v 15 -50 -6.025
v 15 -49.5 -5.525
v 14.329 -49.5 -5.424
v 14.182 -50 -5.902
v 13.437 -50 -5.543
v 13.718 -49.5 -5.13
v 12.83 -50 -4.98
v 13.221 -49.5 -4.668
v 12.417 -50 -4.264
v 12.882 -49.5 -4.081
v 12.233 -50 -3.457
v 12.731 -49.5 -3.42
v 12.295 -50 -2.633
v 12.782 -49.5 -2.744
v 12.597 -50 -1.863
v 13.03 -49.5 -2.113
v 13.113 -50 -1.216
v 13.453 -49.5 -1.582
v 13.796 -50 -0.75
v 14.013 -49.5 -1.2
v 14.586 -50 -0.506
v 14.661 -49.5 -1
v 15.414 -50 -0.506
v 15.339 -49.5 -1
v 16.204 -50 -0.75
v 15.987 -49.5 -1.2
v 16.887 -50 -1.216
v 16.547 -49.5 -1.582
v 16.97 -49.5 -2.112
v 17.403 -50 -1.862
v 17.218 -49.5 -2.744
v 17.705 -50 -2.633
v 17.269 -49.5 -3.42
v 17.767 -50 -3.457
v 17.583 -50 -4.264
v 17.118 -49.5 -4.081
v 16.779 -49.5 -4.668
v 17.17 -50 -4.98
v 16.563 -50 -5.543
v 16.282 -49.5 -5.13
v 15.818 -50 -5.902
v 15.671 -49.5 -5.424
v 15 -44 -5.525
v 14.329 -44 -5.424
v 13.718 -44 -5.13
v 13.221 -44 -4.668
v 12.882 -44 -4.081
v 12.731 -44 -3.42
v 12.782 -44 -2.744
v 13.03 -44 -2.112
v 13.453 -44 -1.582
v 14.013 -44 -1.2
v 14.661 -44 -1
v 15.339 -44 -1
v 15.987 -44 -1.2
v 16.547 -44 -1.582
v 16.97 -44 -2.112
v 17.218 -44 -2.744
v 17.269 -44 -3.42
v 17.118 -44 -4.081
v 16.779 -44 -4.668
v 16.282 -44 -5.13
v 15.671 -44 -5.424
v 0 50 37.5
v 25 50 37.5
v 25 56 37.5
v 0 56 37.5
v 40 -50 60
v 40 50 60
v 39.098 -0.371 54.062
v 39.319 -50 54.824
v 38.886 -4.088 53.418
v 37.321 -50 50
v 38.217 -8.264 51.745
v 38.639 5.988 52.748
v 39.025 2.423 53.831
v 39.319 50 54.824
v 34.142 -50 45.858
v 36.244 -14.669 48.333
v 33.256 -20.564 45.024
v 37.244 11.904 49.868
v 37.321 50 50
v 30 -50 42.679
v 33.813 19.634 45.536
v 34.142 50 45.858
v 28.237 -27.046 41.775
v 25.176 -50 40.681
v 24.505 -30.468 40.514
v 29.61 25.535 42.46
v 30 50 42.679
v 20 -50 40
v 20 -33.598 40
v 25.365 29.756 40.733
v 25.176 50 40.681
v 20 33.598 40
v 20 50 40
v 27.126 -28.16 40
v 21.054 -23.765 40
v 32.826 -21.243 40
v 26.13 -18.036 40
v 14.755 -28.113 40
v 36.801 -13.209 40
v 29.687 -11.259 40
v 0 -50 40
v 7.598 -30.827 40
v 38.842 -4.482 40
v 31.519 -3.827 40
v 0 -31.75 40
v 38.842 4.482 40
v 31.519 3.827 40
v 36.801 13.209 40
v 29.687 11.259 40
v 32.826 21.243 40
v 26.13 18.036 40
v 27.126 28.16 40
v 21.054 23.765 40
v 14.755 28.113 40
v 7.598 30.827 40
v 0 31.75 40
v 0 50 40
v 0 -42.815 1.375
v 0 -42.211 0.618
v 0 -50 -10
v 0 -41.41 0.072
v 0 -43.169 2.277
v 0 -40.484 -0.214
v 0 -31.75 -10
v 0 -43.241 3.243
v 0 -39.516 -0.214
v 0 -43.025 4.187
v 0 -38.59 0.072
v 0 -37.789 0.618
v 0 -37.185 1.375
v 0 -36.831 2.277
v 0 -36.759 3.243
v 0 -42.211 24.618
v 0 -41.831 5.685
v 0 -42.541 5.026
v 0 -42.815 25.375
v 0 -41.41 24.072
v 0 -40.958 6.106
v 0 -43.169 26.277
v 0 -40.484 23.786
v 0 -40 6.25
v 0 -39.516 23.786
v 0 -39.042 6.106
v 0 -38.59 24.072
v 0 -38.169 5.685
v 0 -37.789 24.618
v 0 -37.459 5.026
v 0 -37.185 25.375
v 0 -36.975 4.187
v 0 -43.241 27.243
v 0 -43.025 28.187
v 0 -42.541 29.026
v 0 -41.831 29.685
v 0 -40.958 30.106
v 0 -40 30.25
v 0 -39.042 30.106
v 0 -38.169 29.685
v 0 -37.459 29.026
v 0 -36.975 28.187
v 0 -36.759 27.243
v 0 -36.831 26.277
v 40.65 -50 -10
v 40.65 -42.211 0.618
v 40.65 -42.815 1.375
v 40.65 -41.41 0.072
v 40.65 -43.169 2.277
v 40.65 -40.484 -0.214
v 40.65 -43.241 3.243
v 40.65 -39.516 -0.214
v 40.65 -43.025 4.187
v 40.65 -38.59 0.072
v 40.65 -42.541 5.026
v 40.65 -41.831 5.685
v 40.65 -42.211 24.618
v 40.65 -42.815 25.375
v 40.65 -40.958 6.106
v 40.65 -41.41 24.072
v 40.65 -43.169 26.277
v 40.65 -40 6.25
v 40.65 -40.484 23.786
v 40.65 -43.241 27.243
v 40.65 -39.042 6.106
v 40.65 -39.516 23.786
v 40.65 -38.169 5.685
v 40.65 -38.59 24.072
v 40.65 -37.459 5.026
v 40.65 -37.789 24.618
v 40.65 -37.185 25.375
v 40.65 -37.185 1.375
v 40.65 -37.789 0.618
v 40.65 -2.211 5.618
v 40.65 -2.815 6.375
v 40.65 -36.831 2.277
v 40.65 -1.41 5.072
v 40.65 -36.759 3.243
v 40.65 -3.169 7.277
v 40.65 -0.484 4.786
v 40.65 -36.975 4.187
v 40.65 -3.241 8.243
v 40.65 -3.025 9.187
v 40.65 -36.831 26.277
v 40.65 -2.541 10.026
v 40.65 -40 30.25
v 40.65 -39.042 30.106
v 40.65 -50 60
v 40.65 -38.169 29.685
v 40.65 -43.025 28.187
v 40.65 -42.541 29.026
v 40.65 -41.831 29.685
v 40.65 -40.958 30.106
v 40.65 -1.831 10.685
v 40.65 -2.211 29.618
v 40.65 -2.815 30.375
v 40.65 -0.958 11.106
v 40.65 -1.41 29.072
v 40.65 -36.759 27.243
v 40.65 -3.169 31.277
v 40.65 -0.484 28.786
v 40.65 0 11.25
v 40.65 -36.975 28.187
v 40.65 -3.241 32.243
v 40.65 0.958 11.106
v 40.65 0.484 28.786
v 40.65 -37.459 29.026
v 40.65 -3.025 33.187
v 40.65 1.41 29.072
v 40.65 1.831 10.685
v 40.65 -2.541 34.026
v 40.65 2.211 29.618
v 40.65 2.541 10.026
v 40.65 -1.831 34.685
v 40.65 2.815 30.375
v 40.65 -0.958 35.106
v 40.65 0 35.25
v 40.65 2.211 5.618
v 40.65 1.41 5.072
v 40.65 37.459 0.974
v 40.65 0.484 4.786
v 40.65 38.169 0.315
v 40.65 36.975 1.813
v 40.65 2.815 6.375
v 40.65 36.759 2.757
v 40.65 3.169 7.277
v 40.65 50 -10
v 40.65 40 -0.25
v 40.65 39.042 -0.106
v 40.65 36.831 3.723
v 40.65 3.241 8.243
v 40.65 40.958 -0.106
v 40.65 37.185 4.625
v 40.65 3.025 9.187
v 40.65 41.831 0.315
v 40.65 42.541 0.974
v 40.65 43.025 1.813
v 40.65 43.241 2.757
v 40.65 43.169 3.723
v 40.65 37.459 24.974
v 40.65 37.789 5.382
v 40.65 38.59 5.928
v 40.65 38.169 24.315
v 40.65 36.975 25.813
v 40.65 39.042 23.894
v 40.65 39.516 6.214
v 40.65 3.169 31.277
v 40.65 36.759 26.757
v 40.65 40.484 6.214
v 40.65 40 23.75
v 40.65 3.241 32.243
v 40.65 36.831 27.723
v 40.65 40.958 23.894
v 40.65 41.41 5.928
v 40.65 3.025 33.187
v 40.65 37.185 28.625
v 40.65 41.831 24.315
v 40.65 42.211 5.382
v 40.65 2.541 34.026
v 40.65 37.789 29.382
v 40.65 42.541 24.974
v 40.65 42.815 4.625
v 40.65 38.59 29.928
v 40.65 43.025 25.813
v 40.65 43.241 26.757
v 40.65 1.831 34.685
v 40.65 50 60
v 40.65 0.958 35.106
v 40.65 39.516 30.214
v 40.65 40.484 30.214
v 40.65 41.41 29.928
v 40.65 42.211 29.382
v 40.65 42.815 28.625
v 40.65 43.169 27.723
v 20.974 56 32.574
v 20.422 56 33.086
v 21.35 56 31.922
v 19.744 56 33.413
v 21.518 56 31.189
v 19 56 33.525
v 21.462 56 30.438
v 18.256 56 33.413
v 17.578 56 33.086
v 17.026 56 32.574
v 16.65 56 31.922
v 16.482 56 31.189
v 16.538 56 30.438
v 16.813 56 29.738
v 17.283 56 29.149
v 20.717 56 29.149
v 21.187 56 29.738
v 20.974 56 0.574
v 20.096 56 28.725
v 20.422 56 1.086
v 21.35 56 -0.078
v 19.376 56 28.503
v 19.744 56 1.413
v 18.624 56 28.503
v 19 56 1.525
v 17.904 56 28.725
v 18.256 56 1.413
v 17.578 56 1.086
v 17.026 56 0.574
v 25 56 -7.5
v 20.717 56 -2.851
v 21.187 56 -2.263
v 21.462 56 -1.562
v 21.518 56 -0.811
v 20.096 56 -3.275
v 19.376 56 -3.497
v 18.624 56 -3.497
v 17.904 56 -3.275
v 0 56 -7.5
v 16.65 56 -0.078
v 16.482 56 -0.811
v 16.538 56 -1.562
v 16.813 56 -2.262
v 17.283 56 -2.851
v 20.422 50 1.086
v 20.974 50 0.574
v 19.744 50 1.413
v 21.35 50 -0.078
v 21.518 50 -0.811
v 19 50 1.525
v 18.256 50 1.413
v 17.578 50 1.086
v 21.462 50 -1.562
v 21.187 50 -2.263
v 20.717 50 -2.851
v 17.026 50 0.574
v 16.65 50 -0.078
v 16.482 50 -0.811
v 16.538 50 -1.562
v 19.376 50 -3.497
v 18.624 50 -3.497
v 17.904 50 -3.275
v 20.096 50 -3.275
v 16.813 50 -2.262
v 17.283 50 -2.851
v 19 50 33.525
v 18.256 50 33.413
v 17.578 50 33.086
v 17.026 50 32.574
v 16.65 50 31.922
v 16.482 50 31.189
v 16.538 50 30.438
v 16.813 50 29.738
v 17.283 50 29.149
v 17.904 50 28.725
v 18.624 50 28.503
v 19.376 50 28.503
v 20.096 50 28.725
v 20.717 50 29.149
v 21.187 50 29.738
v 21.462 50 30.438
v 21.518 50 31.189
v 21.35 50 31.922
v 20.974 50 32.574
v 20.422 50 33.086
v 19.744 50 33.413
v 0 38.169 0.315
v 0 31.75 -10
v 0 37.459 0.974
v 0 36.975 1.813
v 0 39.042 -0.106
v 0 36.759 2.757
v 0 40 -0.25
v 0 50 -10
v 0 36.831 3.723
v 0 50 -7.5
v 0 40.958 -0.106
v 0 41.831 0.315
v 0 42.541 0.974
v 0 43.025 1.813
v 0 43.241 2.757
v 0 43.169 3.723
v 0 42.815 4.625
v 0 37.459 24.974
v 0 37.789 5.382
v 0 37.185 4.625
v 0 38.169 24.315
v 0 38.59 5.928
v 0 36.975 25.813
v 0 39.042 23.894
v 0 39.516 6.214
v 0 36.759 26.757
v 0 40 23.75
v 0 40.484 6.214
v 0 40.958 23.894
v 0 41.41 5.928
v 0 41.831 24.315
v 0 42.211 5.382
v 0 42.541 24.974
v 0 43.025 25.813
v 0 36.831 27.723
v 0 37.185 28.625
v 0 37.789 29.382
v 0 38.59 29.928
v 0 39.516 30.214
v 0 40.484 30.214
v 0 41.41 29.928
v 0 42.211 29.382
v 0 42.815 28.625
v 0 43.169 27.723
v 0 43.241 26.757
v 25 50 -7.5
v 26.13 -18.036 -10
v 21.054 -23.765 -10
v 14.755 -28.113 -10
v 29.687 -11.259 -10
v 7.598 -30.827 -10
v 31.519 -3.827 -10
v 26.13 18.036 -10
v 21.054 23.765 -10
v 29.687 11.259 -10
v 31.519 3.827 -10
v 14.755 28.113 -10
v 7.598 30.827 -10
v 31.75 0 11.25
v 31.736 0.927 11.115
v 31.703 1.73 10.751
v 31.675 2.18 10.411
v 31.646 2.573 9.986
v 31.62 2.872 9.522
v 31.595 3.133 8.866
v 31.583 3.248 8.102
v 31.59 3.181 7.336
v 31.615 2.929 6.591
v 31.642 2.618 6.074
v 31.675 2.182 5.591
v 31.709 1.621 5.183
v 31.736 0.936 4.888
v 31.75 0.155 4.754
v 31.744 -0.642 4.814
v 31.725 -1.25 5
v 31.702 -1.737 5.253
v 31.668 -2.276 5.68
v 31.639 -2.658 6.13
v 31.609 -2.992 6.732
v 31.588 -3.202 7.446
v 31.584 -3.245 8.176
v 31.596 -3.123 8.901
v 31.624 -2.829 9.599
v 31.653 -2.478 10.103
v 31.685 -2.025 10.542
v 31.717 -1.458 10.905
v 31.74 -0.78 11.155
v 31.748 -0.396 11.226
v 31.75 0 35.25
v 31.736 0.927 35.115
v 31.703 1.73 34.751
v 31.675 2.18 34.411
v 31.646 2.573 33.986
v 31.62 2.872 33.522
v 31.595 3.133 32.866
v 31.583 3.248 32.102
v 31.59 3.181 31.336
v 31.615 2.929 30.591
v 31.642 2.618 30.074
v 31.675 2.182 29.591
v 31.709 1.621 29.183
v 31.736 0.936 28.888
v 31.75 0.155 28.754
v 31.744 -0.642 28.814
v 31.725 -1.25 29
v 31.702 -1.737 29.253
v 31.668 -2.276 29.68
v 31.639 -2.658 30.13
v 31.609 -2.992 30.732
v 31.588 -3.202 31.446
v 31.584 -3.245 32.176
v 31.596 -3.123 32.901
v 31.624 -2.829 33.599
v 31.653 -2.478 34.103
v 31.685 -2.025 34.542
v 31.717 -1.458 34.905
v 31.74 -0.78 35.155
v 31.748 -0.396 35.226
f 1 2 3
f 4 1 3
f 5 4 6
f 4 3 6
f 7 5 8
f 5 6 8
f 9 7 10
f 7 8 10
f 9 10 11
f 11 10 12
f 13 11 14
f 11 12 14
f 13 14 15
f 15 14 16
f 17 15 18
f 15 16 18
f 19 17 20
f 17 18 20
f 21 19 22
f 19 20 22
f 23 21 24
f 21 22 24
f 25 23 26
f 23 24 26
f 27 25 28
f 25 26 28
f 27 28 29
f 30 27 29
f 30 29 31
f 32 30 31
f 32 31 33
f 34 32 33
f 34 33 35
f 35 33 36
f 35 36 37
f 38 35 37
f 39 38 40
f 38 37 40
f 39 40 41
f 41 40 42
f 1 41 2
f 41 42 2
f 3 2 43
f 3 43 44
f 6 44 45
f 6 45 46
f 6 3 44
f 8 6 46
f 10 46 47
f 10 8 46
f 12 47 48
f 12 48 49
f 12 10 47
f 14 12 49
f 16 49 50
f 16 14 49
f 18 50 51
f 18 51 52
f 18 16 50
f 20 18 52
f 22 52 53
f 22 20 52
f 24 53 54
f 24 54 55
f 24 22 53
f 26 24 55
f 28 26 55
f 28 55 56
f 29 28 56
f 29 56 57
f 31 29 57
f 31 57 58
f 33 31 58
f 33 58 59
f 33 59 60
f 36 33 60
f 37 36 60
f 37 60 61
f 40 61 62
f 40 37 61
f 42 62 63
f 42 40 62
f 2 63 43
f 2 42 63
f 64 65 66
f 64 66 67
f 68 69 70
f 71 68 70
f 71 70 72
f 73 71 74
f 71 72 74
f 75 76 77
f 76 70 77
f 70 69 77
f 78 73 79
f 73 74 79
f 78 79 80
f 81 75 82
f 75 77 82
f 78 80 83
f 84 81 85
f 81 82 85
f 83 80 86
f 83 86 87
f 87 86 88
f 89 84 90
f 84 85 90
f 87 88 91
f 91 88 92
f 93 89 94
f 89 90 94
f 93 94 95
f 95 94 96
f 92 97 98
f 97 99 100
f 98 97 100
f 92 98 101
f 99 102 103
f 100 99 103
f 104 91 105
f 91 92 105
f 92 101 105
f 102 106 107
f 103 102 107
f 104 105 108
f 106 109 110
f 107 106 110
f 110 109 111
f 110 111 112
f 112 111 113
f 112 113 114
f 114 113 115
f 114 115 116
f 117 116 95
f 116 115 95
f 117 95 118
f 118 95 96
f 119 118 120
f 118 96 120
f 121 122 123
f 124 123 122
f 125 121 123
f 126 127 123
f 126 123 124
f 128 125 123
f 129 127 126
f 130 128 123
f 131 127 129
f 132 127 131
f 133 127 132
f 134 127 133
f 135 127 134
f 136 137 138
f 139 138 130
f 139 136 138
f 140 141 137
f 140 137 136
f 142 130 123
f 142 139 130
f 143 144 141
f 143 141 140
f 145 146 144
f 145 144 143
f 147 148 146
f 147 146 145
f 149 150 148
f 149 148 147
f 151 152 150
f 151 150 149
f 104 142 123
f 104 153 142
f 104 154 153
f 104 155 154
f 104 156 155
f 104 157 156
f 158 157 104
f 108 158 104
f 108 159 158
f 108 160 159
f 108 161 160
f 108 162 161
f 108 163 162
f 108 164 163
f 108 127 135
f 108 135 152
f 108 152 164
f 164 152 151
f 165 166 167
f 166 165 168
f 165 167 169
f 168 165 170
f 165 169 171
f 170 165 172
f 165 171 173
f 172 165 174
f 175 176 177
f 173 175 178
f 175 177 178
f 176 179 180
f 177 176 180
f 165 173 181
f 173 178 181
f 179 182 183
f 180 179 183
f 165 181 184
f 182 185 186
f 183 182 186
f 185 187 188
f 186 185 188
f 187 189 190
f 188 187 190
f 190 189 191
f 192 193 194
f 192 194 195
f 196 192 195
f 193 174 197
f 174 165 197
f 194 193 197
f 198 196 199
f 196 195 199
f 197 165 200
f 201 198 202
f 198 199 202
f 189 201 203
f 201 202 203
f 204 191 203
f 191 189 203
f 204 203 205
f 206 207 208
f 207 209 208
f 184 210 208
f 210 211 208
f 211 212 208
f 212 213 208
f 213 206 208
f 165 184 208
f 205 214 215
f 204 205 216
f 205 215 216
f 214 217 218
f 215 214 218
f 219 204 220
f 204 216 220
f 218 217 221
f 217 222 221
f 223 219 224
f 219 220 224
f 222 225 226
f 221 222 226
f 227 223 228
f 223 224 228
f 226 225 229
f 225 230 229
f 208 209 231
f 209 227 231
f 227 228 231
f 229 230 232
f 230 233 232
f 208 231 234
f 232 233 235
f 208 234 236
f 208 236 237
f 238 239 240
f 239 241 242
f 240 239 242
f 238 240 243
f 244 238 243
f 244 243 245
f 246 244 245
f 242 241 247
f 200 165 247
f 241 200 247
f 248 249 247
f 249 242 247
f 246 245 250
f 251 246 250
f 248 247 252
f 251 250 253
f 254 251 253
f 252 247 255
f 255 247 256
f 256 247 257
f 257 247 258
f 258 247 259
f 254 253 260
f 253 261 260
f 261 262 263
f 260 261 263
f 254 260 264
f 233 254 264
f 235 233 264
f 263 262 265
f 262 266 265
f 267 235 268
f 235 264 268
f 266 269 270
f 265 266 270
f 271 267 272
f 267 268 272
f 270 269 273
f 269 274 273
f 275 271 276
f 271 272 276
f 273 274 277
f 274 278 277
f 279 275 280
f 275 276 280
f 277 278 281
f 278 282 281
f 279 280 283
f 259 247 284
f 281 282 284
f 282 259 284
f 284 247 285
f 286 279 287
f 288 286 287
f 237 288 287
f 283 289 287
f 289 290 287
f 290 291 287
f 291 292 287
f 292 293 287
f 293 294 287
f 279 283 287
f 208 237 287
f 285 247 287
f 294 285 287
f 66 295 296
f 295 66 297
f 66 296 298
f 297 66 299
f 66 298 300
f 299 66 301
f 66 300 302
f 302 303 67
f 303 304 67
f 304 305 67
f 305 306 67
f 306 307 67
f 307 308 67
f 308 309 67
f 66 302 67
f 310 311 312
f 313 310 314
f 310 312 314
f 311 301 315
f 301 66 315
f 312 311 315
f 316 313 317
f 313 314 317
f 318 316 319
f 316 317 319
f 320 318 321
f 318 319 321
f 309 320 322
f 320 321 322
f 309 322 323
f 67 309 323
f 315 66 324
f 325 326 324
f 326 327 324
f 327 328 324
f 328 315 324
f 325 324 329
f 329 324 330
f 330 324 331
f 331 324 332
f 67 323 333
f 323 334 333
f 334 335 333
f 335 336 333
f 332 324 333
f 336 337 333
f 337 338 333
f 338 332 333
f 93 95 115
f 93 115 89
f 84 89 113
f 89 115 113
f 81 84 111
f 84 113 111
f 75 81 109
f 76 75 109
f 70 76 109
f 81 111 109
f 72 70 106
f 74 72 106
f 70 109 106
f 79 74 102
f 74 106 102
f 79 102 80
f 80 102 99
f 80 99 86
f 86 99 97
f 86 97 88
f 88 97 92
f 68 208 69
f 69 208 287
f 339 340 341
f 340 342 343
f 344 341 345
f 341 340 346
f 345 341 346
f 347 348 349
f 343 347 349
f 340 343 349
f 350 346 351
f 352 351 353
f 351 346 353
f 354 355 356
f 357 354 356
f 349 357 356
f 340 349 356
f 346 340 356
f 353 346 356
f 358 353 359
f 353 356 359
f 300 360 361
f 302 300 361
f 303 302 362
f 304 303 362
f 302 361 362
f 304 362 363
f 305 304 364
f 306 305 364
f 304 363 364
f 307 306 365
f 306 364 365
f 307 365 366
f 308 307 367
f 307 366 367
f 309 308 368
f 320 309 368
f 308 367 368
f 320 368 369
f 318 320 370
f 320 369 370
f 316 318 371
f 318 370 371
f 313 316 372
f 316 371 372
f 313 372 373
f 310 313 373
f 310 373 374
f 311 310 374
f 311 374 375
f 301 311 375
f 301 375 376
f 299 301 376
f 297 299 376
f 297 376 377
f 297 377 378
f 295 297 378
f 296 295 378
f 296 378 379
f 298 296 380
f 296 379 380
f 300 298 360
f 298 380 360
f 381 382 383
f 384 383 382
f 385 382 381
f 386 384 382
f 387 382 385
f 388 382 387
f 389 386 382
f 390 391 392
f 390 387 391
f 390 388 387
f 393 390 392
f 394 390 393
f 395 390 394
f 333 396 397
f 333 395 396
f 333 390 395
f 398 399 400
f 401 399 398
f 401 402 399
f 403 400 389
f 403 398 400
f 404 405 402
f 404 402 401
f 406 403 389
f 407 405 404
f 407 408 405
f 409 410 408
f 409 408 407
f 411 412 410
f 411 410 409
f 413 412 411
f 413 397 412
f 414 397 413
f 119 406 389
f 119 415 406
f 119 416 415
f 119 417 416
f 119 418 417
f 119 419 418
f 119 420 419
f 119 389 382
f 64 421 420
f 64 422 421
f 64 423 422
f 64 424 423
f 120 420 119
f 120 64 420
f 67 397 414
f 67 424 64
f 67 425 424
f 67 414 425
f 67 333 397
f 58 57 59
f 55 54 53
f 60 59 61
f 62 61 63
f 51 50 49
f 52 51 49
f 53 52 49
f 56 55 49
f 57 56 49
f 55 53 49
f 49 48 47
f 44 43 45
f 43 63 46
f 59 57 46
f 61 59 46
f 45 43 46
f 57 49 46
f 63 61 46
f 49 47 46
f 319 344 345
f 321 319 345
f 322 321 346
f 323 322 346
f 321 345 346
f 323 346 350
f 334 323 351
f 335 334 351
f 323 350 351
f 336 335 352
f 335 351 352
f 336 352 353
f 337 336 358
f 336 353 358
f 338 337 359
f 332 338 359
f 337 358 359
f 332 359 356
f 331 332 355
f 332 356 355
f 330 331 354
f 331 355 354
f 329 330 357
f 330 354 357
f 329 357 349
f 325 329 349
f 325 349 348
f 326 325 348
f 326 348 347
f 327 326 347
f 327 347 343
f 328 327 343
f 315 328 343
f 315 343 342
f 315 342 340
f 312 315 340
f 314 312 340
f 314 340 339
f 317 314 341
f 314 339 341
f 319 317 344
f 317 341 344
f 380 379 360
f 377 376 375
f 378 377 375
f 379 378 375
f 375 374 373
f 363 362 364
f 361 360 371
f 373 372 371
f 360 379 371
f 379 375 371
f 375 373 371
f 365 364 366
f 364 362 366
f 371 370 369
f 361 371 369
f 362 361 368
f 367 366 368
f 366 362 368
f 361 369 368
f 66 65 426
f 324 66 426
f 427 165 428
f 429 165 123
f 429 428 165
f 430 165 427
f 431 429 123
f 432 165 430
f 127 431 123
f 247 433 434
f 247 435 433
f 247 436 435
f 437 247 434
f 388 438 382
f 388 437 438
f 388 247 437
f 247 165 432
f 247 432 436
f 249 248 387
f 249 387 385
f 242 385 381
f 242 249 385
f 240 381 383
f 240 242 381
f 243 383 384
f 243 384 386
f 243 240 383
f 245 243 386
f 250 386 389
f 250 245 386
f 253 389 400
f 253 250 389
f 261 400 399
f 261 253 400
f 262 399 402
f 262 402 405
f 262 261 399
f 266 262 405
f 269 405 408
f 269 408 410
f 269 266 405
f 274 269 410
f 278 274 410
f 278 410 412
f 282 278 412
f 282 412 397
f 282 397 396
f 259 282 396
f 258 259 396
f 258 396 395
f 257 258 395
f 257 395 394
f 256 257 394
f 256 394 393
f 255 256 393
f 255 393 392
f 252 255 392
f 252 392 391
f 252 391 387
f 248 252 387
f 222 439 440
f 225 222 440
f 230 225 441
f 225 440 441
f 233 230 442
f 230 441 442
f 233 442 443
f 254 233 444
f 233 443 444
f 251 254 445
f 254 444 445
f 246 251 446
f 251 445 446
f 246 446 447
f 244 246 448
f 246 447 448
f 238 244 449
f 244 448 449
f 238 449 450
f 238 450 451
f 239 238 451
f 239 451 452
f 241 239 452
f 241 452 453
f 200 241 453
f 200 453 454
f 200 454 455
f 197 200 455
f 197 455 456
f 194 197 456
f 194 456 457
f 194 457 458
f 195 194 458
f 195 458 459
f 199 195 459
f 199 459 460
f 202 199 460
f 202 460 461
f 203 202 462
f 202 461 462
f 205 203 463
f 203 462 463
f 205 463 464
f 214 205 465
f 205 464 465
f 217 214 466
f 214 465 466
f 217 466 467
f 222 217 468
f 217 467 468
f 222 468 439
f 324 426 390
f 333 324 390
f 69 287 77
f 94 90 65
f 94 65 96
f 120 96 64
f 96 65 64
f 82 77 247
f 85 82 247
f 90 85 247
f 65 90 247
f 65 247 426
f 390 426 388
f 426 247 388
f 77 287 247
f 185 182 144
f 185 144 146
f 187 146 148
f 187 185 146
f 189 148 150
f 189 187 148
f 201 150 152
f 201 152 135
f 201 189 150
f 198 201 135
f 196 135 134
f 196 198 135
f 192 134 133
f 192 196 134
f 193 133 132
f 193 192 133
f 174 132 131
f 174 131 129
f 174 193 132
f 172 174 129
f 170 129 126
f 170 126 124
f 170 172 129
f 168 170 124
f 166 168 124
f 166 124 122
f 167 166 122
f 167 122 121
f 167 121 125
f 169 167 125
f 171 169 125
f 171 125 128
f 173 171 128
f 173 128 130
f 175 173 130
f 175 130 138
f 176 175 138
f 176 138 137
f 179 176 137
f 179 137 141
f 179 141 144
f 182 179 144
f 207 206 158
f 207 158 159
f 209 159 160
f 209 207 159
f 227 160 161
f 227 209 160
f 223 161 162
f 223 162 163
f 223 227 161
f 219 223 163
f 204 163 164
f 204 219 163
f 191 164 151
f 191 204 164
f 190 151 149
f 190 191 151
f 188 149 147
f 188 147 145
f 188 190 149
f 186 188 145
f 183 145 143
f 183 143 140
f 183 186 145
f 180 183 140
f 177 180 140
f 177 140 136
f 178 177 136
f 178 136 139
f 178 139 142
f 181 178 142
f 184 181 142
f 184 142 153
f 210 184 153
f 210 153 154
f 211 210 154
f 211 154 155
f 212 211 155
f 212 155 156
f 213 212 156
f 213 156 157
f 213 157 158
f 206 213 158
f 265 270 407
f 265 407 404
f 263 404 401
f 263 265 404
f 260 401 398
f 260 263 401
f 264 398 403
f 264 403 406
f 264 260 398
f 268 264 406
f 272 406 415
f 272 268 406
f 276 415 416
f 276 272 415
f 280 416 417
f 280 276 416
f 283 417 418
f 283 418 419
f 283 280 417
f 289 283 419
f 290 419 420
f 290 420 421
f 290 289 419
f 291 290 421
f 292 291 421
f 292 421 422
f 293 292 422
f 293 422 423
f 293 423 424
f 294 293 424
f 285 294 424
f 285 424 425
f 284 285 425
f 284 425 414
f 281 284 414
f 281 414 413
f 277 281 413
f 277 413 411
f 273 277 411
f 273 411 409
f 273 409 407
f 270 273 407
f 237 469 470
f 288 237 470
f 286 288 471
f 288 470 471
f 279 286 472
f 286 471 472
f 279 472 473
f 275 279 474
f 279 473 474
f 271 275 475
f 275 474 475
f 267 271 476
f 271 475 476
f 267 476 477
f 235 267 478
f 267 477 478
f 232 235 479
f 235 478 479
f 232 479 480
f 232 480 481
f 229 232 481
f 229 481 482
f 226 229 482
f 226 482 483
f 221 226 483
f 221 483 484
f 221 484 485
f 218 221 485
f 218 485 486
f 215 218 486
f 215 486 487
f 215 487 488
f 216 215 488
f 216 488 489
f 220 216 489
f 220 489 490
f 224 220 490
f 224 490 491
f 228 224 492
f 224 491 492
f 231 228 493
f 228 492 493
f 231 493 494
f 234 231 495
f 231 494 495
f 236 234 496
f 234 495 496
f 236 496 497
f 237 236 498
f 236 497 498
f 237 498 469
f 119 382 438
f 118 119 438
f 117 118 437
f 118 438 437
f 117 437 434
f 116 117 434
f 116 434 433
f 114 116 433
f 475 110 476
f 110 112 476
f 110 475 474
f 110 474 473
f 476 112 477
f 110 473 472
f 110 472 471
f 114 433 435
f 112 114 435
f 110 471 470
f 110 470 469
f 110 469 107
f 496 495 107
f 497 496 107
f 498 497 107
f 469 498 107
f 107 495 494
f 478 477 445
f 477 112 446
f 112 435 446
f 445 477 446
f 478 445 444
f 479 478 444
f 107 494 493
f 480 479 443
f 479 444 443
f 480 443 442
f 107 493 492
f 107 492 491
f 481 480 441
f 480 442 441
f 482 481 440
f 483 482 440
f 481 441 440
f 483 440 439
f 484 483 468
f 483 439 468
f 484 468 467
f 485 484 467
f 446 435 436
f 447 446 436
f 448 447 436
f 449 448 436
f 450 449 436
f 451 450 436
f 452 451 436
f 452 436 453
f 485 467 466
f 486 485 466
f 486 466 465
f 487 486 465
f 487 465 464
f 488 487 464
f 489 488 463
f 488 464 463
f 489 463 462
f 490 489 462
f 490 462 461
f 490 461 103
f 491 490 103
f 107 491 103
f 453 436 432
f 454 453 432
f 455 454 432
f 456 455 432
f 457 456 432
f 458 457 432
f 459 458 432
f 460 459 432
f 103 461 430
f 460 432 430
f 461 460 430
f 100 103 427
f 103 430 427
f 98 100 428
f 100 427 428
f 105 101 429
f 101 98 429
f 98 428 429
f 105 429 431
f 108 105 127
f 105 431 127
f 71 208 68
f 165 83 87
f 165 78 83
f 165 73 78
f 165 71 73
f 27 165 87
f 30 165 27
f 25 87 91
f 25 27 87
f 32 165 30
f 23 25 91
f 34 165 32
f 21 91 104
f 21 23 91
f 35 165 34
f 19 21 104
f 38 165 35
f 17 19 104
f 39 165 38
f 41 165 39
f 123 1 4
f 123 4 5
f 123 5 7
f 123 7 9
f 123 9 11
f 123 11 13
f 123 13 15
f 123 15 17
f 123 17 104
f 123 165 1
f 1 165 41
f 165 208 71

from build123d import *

# Parameters (mm, degrees)
CENTRE_HOLE_FOR_L2_DEPTH      = 40
CENTRE_HOLE_FOR_L2_DEPTH_BACK = 10
SKETCH1_R                     = 39.1
SKETCH1_R_2                   = 31.75
MAIN_STRUCTURE_DEPTH          = 60
MAIN_STRUCTURE_DEPTH_BACK     = 50
SKETCH2_W                     = 100
SKETCH2_H                     = 100
SKETCH2_R                     = 39.1
BEARING_CURVE_DEPTH           = 10
SKETCH6_R                     = 10.5
SHAFT_HOLE_DEPTH              = 10
WRIST_CUTOUT_DEPTH            = 188.082869339
SKETCH11_W                    = 25
SKETCH11_H                    = 45
SKETCH11_R                    = 2.525
BOSS_EXTRUDE1_DEPTH           = 6
CUT_EXTRUDE6_DEPTH            = 168.73789077
CUT_EXTRUDE6_DEPTH_BACK       = 168.73789077
SKETCH18_R                    = 3.25
CUT_EXTRUDE7_START            = -1.5875
CUT_EXTRUDE7_DEPTH            = 1.5875
SKETCH9_R                     = 12.05
BEARING_DEPTH                 = 5
CUT_EXTRUDE8_DEPTH            = 3
SKETCH21_R                    = 3.25
SKETCH21_R_2                  = 1.65
CUT_EXTRUDE9_DEPTH            = 167.868211501
CUT_EXTRUDE10_DEPTH           = 6.35
SKETCH23_R                    = 2.275
CUT_EXTRUDE11_DEPTH           = 6
CHAMFER1_SIZE                 = 0.5


with BuildPart() as part:
    # Sketch1 → Centre Hole for L2 (new, two sides: drawn at the far end of the back side and taken through both)
    with BuildSketch(Plane.XY.offset(-CENTRE_HOLE_FOR_L2_DEPTH_BACK)):
        Circle(SKETCH1_R)
        Circle(SKETCH1_R_2, mode=Mode.SUBTRACT)
    extrude(amount=CENTRE_HOLE_FOR_L2_DEPTH + CENTRE_HOLE_FOR_L2_DEPTH_BACK)

    # Sketch2 → Main Structure (add, two sides: drawn at the far end of the back side and taken through both)
    with BuildSketch(Plane.XY.offset(40).offset(-MAIN_STRUCTURE_DEPTH_BACK)):
        Rectangle(SKETCH2_W, SKETCH2_H)
        Circle(SKETCH2_R, mode=Mode.SUBTRACT)
    extrude(amount=MAIN_STRUCTURE_DEPTH + MAIN_STRUCTURE_DEPTH_BACK)

    # Sketch3 → Bearing Curve (add)
    with BuildSketch(Plane.ZY.offset(50)):
        with BuildLine():
            Line((100, 50), (100, -50))
            ThreePointArc((100, -50), (150, 0), (100, 50))
        make_face()
    bearing_curve = extrude(amount=-BEARING_CURVE_DEPTH)

    # Upright Mirror: Bearing Curve across plane
    add(bearing_curve.mirror(Plane(origin=(0, 0, 0), x_dir=(0, 0, 1), z_dir=(1, 0, 0))))

    # Sketch6 → Shaft Hole (cut)
    with BuildSketch(Plane.ZY.offset(50)):
        with Locations((100, 0)):
            Circle(SKETCH6_R)
    extrude(amount=-SHAFT_HOLE_DEPTH, mode=Mode.SUBTRACT)

    # Sketch4 → Wrist Cutout (cut, through all)
    with BuildSketch(Plane(origin=(0, 50, 0), x_dir=(1, 0, 0), z_dir=(0, 1, 0))):
        with BuildLine():
            Line((-40, -100), (-40, -60))
            ThreePointArc((-40, -60), (-34.142135624, -45.857864376), (-20, -40))
            Line((-20, -40), (20, -40))
            ThreePointArc((20, -40), (34.142135624, -45.857864376), (40, -60))
            Line((40, -60), (40, -100))
            Line((40, -100), (-40, -100))
        make_face()
    extrude(amount=-WRIST_CUTOUT_DEPTH, mode=Mode.SUBTRACT)

    # SurfaceCut1
    split(bisect_by=Plane.ZY, keep=Keep.TOP)

    # Sketch11 → Boss-Extrude1 (add)
    with BuildSketch(Plane(origin=(0, 50, 0), x_dir=(1, 0, 0), z_dir=(0, 1, 0))):
        with Locations((-12.5, -15)):
            Rectangle(SKETCH11_W, SKETCH11_H)
        with Locations(Location((-19, 1, 0), (0, 0, 270))):
            Circle(SKETCH11_R, mode=Mode.SUBTRACT)
        with Locations(Location((-19, -31, 0), (0, 0, 270))):
            Circle(SKETCH11_R, mode=Mode.SUBTRACT)
    extrude(amount=BOSS_EXTRUDE1_DEPTH)

    # Sketch18 → Cut-Extrude6 (cut, two sides: drawn at the far end of the back side and taken through both)
    with BuildSketch(Plane.ZY.offset(50).offset(-CUT_EXTRUDE6_DEPTH_BACK)):
        with Locations((8, 0)):
            Circle(SKETCH18_R)
        with Locations((32, 0)):
            Circle(SKETCH18_R)
    extrude(amount=CUT_EXTRUDE6_DEPTH + CUT_EXTRUDE6_DEPTH_BACK, mode=Mode.SUBTRACT)

    # Sketch19 → Cut-Extrude7 (cut)
    with BuildSketch(Plane(origin=(-40, 0, 0), x_dir=(0, 0, -1), z_dir=(1, 0, 0)).offset(CUT_EXTRUDE7_START)):
        with BuildLine():
            Line((-60, 50), (-100, 50))
            ThreePointArc((-100, 50), (-150, 0), (-100, -50))
            Line((-100, -50), (-60, -50))
            Line((-60, -50), (-60, 50))
        make_face()
    extrude(amount=CUT_EXTRUDE7_DEPTH, mode=Mode.SUBTRACT)

    # Sketch9 → Bearing (cut)
    with BuildSketch(Plane(origin=(-41.5875, 0, 0), x_dir=(0, 0, -1), z_dir=(1, 0, 0))):
        with Locations((-100, 0)):
            Circle(SKETCH9_R)
    extrude(amount=-BEARING_DEPTH, mode=Mode.SUBTRACT)

    # Sketch20 → Cut-Extrude8 (cut)
    with BuildSketch(Plane.ZY.offset(50)):
        with BuildLine():
            Line((-10, -50), (100, -50))
            ThreePointArc((100, -50), (150, 0), (100, 50))
            Line((100, 50), (-10, 50))
            Line((-10, 50), (-10, -50))
        make_face()
    extrude(amount=-CUT_EXTRUDE8_DEPTH, mode=Mode.SUBTRACT)

    # Sketch21 → Cut-Extrude9 (cut, through all)
    with BuildSketch(Plane.ZY.offset(47)):
        with Locations((3, -40)):
            Circle(SKETCH21_R)
        with Locations((27, -40)):
            Circle(SKETCH21_R)
        with Locations(Location((27, 40, 0), (0, 0, 180))):
            Circle(SKETCH21_R)
        with Locations(Location((3, 40, 0), (0, 0, 180))):
            Circle(SKETCH21_R)
        with Locations((125, 0)):
            Circle(SKETCH21_R_2)
    extrude(amount=-CUT_EXTRUDE9_DEPTH, mode=Mode.SUBTRACT)

    # Sketch22 → Cut-Extrude10 (cut)
    with BuildSketch(Plane.ZY.offset(47)):
        with BuildLine():
            Line((-10, 50), (-10, -50))
            Line((-10, -50), (100, -50))
            ThreePointArc((100, -50), (150, 0), (100, 50))
            Line((100, 50), (-10, 50))
        make_face()
    extrude(amount=-CUT_EXTRUDE10_DEPTH, mode=Mode.SUBTRACT)

    # Sketch23 → Cut-Extrude11 (cut)
    with BuildSketch(Plane(origin=(0, -50, 0), x_dir=(-1, 0, 0), z_dir=(0, -1, 0))):
        with Locations(Location((15, 3.25, 0), (0, 0, 90))):
            Circle(SKETCH23_R)
    extrude(amount=-CUT_EXTRUDE11_DEPTH, mode=Mode.SUBTRACT)

    # Chamfer1
    chamfer1_edges = [part.edges().sort_by_distance(p)[0] for p in [
        (-15, -50, -0.975),
    ]]
    chamfer(chamfer1_edges, length=CHAMFER1_SIZE)


with BuildPart() as body_2:
    # Mirror1: mirrored copy
    add(part.part.mirror(Plane.ZY))


solid = body_2.part
